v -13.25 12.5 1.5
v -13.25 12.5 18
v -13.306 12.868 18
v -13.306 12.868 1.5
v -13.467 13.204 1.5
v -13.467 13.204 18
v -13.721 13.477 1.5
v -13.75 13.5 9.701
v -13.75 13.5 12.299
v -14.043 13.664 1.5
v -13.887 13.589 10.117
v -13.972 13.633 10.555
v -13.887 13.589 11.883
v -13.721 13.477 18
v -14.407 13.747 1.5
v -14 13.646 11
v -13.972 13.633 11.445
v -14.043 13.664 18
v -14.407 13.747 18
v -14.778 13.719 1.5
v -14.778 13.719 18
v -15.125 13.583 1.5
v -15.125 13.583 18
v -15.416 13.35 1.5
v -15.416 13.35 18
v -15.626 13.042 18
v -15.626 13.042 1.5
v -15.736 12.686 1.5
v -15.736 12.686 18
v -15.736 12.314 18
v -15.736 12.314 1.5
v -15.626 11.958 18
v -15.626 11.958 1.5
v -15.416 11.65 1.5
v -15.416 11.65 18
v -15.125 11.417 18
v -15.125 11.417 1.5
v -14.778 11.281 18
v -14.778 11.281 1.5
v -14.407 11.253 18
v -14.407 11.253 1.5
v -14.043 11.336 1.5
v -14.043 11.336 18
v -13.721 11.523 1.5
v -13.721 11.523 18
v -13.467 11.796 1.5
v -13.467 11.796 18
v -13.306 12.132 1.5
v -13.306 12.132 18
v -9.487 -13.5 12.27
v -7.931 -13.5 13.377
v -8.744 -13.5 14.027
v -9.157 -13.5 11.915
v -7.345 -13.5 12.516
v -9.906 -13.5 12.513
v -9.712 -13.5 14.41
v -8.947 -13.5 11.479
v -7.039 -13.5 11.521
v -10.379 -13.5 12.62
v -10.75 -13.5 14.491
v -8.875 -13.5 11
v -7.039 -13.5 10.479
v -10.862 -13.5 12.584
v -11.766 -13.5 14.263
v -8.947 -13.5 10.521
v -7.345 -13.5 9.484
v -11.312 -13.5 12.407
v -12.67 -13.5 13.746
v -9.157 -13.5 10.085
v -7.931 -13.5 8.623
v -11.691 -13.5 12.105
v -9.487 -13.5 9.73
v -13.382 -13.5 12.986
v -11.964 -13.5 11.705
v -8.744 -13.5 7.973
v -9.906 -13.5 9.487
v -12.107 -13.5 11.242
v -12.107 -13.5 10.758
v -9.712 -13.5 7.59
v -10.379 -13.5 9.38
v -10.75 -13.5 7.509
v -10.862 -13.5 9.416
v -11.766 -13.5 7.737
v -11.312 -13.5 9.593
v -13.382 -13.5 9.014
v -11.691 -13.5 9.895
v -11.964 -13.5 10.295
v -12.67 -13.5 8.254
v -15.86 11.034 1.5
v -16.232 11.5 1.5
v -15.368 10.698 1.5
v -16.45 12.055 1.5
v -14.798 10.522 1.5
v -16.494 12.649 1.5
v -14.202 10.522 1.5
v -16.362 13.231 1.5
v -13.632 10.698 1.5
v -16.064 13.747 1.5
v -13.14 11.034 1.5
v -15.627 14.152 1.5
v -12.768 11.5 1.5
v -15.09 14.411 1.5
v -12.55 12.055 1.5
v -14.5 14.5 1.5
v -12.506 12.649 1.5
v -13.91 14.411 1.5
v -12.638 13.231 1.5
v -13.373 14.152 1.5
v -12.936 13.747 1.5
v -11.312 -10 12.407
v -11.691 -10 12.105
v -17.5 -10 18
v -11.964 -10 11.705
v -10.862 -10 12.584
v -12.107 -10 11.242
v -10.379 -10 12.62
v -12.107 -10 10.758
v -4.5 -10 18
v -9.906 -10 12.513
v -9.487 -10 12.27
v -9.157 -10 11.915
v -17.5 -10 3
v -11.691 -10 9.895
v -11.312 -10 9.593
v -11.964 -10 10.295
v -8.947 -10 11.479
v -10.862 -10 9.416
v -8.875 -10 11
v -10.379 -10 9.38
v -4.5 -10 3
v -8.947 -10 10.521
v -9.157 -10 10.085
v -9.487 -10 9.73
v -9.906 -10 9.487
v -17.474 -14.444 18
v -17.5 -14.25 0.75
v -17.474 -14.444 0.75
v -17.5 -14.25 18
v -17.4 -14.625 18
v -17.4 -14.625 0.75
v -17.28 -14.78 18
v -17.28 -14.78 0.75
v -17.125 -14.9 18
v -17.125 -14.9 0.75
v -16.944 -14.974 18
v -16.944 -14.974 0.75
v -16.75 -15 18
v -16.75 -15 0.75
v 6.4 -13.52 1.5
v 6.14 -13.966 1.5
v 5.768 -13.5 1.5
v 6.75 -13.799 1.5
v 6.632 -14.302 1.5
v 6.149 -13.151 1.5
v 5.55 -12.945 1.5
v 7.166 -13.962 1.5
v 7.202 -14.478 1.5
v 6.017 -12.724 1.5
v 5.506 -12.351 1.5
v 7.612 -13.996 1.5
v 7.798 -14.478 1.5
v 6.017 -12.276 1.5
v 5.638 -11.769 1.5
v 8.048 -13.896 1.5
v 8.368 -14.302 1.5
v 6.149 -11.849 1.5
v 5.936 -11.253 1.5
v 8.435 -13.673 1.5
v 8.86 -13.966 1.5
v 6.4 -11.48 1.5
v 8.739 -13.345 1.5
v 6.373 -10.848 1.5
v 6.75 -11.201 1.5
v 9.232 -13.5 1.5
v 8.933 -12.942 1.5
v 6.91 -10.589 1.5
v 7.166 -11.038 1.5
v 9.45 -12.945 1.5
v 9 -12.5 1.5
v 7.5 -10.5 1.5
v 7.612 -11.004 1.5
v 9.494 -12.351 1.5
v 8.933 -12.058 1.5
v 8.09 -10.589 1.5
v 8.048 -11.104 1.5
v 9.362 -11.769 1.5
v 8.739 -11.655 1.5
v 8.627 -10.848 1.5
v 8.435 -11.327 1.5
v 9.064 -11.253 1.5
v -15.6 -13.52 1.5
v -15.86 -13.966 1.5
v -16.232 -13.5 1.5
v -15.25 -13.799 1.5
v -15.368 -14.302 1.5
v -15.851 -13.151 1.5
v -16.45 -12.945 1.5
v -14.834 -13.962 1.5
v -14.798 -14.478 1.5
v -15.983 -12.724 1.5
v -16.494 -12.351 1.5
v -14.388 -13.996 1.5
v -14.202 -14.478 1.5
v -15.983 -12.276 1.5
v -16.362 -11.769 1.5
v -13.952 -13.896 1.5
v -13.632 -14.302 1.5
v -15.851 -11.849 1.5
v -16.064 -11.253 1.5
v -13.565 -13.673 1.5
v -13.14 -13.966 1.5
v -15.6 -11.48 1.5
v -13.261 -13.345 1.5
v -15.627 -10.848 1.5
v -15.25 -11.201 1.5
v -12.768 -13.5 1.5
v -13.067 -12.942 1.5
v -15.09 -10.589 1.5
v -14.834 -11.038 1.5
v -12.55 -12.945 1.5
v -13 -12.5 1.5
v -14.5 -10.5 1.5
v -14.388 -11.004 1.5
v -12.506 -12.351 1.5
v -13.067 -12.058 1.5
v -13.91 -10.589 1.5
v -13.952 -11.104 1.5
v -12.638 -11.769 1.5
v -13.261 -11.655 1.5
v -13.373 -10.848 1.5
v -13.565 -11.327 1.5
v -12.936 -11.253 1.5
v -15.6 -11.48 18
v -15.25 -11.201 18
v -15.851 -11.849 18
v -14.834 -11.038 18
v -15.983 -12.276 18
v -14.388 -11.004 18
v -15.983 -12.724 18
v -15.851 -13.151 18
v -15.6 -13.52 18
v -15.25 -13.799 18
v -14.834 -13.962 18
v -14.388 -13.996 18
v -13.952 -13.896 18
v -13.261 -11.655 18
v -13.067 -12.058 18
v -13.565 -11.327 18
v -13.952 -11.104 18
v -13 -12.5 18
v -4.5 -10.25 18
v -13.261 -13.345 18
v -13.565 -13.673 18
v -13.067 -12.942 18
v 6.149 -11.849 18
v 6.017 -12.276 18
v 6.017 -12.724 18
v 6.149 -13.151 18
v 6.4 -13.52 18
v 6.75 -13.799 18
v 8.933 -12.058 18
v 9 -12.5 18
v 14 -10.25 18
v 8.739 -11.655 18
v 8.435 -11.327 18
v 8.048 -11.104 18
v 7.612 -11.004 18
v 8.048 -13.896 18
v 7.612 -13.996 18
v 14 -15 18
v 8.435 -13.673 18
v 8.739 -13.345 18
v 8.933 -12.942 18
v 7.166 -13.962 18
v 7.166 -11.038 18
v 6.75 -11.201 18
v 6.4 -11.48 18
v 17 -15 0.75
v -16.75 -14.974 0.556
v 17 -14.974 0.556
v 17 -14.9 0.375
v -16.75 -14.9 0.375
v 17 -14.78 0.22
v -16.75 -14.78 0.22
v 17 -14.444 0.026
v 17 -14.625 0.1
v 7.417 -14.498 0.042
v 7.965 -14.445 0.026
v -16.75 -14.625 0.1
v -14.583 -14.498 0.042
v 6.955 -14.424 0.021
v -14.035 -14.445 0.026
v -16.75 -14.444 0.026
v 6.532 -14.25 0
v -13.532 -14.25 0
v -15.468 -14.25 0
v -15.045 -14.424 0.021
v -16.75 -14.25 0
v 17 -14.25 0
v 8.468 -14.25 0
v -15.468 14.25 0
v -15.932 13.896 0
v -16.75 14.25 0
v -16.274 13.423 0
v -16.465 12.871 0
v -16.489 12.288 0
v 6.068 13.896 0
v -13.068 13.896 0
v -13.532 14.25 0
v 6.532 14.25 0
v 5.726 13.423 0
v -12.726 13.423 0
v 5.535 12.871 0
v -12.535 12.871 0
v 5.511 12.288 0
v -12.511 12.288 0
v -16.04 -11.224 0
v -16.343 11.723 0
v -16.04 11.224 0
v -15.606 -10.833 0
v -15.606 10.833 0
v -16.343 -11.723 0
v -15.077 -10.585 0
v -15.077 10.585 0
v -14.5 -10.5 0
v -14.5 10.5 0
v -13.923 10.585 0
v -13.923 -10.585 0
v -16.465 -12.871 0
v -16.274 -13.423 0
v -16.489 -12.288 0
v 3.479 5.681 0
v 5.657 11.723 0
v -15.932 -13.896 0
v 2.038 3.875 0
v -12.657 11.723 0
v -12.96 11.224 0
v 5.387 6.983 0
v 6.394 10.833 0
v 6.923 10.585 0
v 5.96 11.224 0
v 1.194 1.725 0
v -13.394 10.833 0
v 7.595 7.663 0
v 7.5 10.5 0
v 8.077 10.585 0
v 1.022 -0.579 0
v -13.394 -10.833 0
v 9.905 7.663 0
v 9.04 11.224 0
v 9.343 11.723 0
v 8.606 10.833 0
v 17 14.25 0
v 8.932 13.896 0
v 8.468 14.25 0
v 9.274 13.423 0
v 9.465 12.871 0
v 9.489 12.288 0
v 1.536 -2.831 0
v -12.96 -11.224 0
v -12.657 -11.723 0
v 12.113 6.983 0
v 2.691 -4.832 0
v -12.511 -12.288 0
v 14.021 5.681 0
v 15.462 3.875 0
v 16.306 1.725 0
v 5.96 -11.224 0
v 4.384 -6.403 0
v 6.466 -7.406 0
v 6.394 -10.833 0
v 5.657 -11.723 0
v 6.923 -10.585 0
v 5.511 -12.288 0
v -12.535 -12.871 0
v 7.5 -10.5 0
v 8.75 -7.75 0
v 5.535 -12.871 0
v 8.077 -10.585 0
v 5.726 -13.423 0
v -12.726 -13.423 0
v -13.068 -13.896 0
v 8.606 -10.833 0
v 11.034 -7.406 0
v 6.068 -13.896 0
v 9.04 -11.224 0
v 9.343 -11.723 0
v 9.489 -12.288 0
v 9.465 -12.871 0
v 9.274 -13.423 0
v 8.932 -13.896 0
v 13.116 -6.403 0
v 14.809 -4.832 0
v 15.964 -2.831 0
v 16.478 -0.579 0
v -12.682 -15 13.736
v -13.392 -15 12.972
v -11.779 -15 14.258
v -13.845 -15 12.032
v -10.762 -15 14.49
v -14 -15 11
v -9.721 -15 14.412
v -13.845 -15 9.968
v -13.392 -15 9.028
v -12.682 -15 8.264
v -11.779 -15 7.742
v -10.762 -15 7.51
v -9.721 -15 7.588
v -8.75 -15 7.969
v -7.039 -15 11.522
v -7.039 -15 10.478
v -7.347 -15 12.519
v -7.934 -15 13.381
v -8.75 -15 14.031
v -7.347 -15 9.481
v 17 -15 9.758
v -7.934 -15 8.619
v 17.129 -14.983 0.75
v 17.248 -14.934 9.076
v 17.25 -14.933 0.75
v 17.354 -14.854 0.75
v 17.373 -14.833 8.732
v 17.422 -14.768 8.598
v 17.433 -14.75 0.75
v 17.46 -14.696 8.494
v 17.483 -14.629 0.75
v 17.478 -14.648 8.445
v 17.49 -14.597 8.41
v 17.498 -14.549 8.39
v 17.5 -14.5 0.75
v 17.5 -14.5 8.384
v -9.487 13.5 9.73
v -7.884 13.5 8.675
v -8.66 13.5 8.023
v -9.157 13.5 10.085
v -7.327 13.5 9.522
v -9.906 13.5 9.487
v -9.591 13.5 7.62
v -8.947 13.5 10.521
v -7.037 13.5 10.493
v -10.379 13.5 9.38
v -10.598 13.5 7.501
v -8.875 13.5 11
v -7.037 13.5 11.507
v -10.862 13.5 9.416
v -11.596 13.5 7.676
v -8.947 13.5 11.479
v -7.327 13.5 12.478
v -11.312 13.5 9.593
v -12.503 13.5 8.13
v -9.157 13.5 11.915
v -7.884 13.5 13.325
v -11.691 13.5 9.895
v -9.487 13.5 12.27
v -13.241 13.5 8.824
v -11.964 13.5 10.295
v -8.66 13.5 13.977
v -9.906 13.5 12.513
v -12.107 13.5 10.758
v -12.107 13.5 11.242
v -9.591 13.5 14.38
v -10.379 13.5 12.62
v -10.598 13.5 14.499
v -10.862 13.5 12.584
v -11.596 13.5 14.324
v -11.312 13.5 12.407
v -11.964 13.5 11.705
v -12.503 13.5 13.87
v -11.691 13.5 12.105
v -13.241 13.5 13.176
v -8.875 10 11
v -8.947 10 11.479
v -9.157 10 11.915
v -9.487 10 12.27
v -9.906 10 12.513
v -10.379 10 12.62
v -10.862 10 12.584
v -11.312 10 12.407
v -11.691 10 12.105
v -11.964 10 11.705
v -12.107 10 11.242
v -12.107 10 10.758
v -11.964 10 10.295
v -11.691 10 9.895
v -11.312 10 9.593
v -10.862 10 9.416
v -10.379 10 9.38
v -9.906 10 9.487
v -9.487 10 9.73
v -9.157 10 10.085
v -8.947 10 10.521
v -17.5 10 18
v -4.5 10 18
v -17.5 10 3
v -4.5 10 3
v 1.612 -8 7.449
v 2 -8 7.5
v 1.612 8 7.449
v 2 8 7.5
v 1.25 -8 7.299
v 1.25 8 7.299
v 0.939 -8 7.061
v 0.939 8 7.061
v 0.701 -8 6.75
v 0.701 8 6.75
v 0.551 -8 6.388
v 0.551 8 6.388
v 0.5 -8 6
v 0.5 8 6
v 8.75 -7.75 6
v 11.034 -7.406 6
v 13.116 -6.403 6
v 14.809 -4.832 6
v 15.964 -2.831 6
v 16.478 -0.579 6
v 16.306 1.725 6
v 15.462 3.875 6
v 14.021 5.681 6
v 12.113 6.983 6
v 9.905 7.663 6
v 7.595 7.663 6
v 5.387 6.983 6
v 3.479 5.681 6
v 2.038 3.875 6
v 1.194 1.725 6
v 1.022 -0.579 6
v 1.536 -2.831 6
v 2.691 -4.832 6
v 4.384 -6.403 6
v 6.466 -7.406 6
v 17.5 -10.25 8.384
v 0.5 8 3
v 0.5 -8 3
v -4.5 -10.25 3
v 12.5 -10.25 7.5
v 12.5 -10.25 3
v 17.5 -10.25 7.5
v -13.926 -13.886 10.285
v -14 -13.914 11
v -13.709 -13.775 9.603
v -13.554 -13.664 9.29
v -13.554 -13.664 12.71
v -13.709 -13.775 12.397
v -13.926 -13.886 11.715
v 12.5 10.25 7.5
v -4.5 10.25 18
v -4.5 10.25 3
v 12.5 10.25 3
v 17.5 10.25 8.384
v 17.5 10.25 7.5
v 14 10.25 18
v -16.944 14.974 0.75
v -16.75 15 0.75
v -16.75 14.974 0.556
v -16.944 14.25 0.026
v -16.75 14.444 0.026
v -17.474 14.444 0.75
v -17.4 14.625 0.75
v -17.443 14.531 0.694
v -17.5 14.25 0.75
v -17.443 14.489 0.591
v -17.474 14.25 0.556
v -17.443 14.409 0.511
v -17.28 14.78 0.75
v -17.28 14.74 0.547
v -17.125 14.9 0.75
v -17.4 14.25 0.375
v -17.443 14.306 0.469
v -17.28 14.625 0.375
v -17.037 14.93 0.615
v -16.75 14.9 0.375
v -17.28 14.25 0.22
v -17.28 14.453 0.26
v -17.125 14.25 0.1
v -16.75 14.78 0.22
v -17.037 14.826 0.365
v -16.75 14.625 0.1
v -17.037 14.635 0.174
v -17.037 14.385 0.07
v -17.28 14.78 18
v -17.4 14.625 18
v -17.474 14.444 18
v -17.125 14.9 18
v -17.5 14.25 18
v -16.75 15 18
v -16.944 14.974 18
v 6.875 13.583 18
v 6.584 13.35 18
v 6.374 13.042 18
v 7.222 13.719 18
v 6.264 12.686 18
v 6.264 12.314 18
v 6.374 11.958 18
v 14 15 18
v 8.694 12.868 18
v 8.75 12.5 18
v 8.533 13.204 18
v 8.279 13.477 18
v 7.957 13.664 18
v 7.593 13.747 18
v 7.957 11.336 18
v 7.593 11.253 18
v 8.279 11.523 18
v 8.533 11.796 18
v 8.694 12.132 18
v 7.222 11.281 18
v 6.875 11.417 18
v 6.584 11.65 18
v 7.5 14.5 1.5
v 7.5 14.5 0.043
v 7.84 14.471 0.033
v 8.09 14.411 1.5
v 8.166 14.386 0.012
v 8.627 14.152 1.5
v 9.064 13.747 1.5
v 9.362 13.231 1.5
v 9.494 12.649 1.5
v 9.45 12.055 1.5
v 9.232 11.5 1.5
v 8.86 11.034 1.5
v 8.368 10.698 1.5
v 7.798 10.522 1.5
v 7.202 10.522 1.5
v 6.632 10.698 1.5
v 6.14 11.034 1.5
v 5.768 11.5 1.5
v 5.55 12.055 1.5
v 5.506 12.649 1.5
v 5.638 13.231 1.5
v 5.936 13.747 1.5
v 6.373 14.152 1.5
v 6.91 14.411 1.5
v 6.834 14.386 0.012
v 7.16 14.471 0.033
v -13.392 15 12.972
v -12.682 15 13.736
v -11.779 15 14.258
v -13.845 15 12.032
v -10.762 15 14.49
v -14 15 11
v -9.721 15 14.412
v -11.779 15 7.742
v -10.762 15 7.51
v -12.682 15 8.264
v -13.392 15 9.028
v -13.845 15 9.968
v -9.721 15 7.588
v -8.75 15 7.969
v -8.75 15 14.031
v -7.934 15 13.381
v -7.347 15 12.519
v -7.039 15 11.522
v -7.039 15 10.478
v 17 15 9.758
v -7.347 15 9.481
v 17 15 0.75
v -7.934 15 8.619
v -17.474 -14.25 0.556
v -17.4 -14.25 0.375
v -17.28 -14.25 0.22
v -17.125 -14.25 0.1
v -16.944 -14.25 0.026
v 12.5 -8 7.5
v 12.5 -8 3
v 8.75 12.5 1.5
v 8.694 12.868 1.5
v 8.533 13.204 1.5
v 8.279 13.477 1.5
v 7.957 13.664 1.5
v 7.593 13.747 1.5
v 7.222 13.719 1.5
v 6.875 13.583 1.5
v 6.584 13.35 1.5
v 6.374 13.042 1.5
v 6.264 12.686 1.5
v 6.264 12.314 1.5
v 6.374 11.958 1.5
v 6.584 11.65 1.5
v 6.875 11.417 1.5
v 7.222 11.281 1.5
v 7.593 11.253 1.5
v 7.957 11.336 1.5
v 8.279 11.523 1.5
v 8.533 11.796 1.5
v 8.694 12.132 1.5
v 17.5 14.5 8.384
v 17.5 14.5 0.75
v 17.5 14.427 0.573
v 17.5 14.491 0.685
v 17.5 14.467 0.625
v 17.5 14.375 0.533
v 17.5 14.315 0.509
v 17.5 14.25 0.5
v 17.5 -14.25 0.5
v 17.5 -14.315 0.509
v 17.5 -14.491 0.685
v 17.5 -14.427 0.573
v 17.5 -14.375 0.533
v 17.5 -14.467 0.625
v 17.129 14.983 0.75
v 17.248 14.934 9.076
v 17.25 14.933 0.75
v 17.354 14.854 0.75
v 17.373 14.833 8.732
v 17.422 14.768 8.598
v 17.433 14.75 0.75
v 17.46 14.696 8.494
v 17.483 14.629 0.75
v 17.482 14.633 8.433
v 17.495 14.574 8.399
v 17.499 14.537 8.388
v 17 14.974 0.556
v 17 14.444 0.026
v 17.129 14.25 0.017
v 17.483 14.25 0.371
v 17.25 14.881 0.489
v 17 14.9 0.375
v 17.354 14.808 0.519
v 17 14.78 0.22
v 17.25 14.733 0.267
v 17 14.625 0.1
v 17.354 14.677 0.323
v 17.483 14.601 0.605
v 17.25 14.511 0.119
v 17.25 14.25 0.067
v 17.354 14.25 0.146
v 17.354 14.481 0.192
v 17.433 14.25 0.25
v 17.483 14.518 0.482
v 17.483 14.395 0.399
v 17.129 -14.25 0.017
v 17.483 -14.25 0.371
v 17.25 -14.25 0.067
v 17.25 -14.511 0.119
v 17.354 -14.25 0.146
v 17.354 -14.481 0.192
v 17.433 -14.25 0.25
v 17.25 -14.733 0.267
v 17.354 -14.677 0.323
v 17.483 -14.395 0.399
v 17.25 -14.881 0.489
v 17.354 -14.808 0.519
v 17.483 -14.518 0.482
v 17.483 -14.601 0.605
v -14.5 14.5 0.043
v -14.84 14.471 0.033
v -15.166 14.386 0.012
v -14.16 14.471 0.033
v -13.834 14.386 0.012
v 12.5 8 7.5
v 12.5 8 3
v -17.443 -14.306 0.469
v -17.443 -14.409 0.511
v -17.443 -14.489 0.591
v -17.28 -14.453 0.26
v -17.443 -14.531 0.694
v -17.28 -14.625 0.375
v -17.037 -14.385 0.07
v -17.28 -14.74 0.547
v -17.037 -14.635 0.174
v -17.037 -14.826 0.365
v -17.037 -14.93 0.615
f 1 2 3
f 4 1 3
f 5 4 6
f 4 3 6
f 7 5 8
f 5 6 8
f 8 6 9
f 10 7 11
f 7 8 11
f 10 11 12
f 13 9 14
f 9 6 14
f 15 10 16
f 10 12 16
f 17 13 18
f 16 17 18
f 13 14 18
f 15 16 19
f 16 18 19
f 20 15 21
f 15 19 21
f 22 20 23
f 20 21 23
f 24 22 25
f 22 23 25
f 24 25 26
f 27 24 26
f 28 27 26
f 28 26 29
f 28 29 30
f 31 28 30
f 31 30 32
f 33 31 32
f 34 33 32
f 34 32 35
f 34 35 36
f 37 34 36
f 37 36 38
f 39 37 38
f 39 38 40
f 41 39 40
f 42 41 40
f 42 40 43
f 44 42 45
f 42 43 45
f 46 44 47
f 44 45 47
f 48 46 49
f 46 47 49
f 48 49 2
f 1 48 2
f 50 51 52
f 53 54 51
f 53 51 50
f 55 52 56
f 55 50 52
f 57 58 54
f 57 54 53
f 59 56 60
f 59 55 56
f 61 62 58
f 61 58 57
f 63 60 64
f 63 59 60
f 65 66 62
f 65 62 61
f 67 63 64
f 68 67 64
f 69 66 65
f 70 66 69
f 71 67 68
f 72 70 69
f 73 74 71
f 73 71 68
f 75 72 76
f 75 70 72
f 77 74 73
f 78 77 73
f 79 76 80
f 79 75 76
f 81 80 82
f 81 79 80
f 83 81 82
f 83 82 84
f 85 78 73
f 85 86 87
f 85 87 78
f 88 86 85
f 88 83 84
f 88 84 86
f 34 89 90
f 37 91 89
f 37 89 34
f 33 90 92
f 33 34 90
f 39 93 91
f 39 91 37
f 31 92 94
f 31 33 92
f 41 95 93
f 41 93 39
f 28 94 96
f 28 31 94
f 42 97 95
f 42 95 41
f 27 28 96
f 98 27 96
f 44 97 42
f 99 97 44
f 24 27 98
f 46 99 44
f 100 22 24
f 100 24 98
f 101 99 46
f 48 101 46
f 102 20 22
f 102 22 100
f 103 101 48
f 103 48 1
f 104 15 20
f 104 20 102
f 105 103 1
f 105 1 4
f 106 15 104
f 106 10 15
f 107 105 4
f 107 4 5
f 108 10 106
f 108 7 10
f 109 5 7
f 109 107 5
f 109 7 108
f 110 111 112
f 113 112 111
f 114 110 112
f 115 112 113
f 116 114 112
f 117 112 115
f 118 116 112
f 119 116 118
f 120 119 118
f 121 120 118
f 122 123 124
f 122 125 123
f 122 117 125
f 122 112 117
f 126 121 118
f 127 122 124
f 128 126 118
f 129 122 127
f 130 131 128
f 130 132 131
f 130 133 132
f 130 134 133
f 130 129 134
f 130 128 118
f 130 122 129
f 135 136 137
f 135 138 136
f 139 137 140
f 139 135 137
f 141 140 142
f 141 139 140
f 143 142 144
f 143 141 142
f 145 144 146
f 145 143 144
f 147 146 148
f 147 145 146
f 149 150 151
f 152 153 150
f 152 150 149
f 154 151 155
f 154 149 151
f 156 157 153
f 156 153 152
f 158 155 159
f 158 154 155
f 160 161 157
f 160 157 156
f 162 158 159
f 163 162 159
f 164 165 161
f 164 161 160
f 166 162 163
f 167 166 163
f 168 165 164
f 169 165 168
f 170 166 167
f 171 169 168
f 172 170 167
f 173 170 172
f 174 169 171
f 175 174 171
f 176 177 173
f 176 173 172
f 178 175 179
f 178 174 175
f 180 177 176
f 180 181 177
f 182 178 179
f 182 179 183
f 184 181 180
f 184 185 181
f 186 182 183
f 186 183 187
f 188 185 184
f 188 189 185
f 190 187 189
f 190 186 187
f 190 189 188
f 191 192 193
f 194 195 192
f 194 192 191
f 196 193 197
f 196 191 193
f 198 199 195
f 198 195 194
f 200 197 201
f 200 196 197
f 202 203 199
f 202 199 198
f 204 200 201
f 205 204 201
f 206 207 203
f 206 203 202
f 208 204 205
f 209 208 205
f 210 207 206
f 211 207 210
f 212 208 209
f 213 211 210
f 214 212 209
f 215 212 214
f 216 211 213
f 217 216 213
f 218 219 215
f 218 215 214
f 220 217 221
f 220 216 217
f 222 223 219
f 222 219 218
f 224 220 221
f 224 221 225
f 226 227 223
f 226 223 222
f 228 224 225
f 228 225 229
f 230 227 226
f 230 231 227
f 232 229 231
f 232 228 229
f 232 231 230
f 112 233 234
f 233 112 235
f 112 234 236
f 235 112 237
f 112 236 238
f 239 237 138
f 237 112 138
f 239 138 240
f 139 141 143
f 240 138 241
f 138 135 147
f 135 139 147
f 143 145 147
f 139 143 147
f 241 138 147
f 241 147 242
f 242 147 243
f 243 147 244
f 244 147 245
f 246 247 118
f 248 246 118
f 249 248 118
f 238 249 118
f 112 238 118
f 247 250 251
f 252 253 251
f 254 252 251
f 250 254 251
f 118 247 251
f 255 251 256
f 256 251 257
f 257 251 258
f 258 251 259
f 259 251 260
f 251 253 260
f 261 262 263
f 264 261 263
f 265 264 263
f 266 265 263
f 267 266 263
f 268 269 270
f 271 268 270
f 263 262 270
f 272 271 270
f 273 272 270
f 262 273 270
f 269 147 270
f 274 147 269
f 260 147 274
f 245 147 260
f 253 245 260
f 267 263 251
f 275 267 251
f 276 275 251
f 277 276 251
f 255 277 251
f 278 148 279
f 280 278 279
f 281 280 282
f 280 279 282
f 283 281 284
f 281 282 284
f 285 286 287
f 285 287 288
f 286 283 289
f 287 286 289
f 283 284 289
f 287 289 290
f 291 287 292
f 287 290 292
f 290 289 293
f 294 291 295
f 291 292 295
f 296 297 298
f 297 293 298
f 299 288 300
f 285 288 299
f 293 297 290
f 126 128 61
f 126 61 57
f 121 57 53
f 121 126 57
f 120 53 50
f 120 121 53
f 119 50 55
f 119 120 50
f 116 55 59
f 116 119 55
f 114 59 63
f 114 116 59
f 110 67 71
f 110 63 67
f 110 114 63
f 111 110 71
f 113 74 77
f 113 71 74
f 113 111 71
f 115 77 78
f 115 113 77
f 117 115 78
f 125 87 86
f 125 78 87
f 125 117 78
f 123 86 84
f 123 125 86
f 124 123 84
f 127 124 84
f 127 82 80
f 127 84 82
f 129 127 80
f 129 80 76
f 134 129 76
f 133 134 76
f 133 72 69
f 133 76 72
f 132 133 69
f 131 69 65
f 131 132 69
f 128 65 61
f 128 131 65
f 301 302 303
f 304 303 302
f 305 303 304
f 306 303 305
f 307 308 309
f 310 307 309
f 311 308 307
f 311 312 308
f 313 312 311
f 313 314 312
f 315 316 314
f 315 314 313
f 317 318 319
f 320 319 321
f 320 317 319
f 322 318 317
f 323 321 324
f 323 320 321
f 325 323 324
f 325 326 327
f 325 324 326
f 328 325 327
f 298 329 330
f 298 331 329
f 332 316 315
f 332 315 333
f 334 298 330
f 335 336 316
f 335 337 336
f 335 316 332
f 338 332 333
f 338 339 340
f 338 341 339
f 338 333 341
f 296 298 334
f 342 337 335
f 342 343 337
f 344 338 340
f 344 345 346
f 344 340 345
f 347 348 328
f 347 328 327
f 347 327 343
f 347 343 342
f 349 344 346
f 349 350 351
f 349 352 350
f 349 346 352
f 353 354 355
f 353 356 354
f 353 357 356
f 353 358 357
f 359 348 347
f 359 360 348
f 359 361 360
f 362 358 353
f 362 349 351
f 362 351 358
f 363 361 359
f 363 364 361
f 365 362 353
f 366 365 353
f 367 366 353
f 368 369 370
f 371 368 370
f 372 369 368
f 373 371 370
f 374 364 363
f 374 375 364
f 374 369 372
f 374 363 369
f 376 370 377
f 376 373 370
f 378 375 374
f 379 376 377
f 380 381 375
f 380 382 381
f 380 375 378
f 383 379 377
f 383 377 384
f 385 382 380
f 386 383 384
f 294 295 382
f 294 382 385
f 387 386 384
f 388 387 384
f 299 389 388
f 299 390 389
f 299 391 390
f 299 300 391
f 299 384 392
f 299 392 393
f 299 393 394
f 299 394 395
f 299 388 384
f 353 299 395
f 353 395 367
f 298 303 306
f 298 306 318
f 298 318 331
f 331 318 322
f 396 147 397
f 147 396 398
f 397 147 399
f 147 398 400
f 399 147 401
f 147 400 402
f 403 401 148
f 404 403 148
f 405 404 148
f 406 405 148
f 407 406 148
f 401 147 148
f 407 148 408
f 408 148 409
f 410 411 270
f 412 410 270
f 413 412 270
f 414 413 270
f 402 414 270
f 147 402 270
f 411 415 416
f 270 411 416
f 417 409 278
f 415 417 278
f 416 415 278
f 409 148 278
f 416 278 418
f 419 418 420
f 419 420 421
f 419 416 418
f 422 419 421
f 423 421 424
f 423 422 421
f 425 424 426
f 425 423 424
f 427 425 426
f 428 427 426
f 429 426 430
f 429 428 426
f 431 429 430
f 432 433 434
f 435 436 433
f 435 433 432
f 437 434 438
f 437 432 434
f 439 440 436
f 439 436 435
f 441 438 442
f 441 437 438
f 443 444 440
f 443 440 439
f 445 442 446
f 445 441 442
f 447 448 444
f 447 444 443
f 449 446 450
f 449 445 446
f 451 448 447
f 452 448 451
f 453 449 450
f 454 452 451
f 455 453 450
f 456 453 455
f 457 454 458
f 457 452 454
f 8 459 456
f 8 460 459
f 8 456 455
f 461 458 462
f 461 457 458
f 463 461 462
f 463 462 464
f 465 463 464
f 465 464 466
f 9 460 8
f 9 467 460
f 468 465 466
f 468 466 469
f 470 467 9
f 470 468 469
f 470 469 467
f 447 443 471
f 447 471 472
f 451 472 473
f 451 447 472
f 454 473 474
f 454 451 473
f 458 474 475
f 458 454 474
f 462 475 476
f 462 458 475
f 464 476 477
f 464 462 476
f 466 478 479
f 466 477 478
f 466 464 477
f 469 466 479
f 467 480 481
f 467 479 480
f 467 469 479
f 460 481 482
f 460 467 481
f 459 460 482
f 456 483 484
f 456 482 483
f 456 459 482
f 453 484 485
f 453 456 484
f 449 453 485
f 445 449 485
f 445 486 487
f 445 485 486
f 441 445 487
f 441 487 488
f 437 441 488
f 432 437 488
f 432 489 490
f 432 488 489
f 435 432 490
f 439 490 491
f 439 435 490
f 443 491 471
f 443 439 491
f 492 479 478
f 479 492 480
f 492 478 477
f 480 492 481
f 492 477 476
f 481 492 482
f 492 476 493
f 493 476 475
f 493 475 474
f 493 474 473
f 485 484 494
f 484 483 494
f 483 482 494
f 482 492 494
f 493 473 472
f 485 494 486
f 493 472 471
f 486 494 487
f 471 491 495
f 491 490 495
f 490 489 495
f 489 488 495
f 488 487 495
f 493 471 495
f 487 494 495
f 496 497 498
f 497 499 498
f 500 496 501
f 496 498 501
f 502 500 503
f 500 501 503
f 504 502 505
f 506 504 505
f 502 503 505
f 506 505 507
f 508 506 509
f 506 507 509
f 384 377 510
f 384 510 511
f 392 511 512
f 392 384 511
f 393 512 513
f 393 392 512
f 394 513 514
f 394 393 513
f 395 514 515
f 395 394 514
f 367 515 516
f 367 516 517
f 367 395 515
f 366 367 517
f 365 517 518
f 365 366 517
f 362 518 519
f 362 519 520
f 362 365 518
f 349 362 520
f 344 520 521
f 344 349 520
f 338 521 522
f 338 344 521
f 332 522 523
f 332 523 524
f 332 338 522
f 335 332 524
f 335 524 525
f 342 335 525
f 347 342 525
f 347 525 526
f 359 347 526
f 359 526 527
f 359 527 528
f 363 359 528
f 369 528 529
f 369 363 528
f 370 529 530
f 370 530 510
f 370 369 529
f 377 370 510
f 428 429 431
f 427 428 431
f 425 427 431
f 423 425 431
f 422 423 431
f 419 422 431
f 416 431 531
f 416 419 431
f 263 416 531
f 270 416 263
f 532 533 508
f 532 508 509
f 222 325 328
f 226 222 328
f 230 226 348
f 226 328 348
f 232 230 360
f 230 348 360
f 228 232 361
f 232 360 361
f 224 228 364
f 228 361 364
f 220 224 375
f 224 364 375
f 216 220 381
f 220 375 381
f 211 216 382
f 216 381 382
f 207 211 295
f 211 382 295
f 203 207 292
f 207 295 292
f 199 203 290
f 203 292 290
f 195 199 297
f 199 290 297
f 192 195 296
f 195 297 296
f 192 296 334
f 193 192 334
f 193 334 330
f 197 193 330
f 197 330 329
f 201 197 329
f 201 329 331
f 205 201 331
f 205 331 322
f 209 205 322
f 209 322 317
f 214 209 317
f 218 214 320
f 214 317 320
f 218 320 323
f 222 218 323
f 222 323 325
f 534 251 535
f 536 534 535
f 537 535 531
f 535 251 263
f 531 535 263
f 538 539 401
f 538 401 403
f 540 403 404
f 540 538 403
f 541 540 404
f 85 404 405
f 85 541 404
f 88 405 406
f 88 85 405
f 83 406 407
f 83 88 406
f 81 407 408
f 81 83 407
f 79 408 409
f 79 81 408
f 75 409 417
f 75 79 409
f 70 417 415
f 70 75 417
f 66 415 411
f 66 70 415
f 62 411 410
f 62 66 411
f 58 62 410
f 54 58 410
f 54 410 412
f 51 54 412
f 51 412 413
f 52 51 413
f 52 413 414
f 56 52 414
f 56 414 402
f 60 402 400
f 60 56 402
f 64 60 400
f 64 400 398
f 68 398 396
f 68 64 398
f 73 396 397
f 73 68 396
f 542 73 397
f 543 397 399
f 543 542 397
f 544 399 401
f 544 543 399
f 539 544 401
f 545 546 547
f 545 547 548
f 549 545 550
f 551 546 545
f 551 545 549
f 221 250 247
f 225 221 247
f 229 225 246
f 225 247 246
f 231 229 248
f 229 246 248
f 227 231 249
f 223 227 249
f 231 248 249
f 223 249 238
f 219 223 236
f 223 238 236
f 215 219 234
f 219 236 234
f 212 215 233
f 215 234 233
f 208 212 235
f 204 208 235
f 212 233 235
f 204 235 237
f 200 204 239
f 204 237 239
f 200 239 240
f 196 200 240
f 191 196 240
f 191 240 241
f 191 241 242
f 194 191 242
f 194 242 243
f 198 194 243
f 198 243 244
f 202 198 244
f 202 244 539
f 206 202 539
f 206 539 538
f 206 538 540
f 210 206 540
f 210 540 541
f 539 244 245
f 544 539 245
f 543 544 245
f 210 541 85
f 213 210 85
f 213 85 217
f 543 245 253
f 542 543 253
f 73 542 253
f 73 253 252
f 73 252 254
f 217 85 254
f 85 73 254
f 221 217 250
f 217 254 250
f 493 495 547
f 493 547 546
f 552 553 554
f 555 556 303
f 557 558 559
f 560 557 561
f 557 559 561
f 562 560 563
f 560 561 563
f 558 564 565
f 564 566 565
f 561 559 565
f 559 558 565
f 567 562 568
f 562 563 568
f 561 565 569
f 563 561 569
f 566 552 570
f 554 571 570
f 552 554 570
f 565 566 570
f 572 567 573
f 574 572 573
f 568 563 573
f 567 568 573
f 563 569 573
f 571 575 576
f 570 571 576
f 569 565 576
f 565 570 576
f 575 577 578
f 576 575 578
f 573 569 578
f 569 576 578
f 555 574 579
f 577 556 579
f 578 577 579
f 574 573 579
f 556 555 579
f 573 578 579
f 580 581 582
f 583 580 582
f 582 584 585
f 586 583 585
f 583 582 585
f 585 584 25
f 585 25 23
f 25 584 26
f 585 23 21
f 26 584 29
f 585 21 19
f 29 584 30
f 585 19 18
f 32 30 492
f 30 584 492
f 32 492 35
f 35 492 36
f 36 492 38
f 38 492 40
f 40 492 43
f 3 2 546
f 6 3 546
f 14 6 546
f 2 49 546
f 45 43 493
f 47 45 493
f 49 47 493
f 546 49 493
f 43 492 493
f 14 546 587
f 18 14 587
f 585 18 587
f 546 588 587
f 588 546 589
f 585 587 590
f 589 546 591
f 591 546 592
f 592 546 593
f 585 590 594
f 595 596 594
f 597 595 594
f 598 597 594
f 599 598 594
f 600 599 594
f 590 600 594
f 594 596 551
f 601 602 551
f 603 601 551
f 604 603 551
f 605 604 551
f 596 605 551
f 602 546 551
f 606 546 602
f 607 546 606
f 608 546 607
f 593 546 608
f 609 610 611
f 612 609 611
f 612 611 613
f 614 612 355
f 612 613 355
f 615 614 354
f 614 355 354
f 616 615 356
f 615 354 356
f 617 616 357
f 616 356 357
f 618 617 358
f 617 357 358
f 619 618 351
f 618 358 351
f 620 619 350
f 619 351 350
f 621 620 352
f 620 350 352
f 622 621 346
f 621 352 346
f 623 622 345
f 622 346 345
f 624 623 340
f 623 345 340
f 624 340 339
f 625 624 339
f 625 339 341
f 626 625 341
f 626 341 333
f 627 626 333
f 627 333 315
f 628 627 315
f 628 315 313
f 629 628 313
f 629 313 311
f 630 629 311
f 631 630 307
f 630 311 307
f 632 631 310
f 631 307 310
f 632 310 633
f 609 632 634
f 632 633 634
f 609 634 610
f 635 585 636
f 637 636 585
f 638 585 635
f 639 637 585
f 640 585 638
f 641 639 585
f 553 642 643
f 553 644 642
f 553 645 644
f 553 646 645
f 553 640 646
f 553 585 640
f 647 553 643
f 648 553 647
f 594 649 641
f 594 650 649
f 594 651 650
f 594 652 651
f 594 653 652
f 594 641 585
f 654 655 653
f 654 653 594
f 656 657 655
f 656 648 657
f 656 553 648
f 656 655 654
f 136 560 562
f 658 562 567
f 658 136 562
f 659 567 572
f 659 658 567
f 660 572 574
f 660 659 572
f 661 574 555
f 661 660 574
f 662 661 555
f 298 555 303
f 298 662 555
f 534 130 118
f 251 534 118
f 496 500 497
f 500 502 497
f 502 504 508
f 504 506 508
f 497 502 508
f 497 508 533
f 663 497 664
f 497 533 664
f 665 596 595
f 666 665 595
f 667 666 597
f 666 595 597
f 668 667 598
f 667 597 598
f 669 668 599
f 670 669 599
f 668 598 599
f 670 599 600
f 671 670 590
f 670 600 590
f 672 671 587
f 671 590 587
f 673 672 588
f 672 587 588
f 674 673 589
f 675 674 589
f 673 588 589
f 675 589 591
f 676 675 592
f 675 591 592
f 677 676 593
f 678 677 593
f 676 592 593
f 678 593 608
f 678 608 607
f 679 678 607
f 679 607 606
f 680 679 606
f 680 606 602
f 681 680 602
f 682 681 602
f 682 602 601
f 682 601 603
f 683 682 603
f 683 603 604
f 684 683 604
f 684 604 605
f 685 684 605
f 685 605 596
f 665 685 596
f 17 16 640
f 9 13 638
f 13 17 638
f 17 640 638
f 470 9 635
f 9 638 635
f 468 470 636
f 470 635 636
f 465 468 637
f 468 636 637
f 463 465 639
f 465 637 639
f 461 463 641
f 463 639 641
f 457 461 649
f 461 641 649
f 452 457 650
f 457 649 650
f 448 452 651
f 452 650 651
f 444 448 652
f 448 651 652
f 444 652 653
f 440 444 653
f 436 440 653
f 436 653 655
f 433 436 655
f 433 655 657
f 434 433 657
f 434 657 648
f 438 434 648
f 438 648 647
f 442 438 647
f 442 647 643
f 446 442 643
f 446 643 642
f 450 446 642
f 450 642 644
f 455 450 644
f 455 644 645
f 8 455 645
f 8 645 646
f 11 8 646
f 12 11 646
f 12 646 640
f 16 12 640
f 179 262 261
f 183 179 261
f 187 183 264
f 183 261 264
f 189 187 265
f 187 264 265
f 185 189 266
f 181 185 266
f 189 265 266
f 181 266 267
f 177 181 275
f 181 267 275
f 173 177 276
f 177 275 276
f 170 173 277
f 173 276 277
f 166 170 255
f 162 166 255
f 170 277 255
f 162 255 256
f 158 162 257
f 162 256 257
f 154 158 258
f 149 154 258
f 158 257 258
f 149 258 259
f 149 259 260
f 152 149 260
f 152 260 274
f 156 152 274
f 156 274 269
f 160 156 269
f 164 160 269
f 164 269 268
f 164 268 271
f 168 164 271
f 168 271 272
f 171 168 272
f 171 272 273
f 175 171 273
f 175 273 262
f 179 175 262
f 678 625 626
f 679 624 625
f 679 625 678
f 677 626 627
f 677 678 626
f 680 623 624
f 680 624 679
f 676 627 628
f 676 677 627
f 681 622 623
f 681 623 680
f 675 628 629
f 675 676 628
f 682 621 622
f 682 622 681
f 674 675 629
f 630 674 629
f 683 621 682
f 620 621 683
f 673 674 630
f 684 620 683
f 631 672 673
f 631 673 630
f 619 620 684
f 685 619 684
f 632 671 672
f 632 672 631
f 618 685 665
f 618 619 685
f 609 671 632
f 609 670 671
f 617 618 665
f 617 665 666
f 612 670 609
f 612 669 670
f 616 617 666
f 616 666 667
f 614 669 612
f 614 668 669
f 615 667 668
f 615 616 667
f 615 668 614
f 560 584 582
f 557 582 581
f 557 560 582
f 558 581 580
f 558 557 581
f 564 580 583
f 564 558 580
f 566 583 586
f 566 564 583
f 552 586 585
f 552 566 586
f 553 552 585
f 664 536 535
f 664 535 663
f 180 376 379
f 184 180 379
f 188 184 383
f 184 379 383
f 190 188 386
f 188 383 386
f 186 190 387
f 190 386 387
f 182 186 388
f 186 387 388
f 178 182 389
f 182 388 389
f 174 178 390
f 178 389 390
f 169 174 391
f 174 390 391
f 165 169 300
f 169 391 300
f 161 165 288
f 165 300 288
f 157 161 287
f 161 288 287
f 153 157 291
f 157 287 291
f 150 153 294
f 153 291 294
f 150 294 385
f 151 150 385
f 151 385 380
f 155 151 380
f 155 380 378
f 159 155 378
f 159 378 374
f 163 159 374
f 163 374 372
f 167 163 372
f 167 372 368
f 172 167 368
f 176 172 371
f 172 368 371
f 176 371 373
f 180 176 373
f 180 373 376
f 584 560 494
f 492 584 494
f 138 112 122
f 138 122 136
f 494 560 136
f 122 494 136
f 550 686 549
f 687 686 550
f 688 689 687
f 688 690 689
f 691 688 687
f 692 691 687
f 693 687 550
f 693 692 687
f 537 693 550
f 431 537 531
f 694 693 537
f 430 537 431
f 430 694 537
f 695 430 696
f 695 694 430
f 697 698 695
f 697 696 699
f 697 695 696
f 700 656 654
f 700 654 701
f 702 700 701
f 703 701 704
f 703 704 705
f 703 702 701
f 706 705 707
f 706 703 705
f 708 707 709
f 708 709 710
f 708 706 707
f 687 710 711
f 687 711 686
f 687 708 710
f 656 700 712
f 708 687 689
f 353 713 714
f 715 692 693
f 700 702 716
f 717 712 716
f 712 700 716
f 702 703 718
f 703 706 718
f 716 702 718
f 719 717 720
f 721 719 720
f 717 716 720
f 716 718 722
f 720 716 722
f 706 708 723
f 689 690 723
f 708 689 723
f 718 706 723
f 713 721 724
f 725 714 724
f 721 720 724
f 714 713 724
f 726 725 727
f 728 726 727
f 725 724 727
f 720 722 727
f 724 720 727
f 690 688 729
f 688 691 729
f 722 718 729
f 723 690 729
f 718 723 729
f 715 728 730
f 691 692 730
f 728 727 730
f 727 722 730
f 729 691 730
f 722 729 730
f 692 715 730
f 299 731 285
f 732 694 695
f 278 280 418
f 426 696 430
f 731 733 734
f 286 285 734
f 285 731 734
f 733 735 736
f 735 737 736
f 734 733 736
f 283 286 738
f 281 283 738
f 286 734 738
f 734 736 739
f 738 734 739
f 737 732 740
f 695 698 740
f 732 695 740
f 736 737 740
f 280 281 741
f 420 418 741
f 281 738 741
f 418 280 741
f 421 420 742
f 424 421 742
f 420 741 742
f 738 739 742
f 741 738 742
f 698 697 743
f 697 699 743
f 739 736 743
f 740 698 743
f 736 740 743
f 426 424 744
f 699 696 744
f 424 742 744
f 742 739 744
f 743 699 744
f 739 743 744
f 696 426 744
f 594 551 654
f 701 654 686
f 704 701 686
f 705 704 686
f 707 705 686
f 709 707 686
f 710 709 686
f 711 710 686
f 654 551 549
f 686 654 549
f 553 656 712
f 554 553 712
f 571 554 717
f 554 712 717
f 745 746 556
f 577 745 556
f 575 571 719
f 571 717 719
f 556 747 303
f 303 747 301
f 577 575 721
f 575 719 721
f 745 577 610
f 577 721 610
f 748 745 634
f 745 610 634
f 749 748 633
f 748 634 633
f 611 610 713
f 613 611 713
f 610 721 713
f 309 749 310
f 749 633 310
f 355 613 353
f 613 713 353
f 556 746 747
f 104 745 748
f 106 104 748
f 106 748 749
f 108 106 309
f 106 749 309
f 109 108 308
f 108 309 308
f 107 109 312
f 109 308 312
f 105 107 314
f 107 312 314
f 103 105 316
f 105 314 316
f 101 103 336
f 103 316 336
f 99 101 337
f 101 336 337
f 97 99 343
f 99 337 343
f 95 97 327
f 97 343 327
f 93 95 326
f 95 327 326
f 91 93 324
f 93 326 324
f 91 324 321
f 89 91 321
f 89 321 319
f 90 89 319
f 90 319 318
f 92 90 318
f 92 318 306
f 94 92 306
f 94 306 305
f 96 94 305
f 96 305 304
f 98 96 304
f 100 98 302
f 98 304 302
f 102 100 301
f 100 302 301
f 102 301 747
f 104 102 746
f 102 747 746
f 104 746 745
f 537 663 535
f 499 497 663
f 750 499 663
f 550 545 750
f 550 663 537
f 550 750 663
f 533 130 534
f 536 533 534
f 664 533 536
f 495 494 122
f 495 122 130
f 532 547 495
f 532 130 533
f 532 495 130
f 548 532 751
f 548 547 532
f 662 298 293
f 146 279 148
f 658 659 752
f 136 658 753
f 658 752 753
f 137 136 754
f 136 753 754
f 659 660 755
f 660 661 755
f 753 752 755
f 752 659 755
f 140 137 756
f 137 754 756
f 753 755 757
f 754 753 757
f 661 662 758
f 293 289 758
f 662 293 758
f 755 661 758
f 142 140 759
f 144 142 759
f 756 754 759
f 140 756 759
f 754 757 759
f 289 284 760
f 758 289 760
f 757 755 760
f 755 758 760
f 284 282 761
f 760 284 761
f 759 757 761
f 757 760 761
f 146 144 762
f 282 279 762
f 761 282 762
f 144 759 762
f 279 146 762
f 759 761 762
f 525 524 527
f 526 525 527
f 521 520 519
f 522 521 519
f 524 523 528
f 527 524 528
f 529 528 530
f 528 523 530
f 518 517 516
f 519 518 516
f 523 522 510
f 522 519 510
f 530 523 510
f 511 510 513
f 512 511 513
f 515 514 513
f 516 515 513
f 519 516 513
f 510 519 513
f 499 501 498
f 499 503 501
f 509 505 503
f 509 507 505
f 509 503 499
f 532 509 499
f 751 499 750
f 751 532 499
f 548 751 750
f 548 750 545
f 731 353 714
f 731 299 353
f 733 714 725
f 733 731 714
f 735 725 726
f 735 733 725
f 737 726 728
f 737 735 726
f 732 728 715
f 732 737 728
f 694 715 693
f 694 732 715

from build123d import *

# Parameters (mm, degrees)
SKETCH1_W              = 35
SKETCH1_H              = 20
BASE_PLATE_DEPTH       = 3
SKETCH2_W              = 35
SKETCH2_H              = 5
SIDE_WALLS_DEPTH       = 18
SKETCH4_R              = 1.5
SKETCH4_R_2            = 1.25
M2_SCREWS_DEPTH        = 18
SKETCH6_W              = 5
SKETCH6_H              = 20
RETURN_STOPPER_DEPTH   = 4.5
SKETCH9_W              = 12
SKETCH9_H              = 16
BOSS_EXTRUDE1_DEPTH    = 4.5
SKETCH7_R              = 7.75
MAGNET_POCKET_DEPTH    = 6
SKETCH8_R              = 2
M2_SCREW_HEAD_DEPTH    = 1.5
M3_ACHSLE_DEPTH        = 36.429507476
M3_ACHSLE_DEPTH_BACK   = 36.429507476
SKETCH5_R              = 1.625
SKETCH14_R             = 3.5
CUT_EXTRUDE1_DEPTH     = 1.5
CUT_EXTRUDE2_START     = -1.5
SKETCH15_R             = 3.5
CUT_EXTRUDE2_DEPTH     = 1.5
FILLET1_R              = 1.5
LEAVER_START           = -0.25
SKETCH11_W             = 22
SKETCH11_H             = 10.5
LEAVER_SPACE_DEPTH     = 20.5
SKETCH12_W             = 17
SKETCH12_H             = 4.5
MORE_SPACE_LEFT_DEPTH  = 0.25
SKETCH13_W             = 17
SKETCH13_H             = 4.5
MORE_SPACE_RIGHT_DEPTH = 0.25
FILLET2_R              = 0.75
FILLET3_R              = 0.75
FILLET4_R              = 0.75
FILLET5_R              = 0.5
CHAMFER1_SIZE          = 3.5
CHAMFER1_SIZE_2        = 9.616170968


with BuildPart() as part:
    # Sketch1 → Base Plate (new body)
    with BuildSketch(Plane.XY):
        Rectangle(SKETCH1_W, SKETCH1_H)
    extrude(amount=BASE_PLATE_DEPTH)

    # Sketch2 → Side Walls (add)
    with BuildSketch(Plane(origin=(0, 0, 0), x_dir=(1, 0, 0), z_dir=(0, 0, -1))):
        with Locations((0, -12.5)):
            Rectangle(SKETCH2_W, SKETCH2_H)
        with Locations((0, 12.5)):
            Rectangle(SKETCH2_W, SKETCH2_H)
    extrude(amount=-SIDE_WALLS_DEPTH)

    # Sketch4 → M2 Screws (cut)
    with BuildSketch(Plane.XY.offset(18)):
        with Locations((-14.5, -12.5)):
            Circle(SKETCH4_R)
        with Locations((7.5, -12.5)):
            Circle(SKETCH4_R)
        with Locations((7.5, 12.5)):
            Circle(SKETCH4_R_2)
        with Locations((-14.5, 12.5)):
            Circle(SKETCH4_R_2)
    extrude(amount=-M2_SCREWS_DEPTH, mode=Mode.SUBTRACT)

    # Sketch6 → Return Stopper (add)
    with BuildSketch(Plane.XY.offset(3)):
        with Locations((15, 0)):
            Rectangle(SKETCH6_W, SKETCH6_H)
    extrude(amount=RETURN_STOPPER_DEPTH)

    # Sketch9 → Boss-Extrude1 (add)
    with BuildSketch(Plane.XY.offset(3)):
        with Locations((6.5, 0)):
            Rectangle(SKETCH9_W, SKETCH9_H)
    extrude(amount=BOSS_EXTRUDE1_DEPTH)

    # Sketch7 → Magnet Pocket (cut)
    with BuildSketch(Plane(origin=(0, 0, 0), x_dir=(-1, 0, 0), z_dir=(0, 0, 1))):
        with Locations(Location((-8.75, 0, 0), (0, 0, 90))):
            Circle(SKETCH7_R)
    extrude(amount=MAGNET_POCKET_DEPTH, mode=Mode.SUBTRACT)

    # Sketch8 → M2 Screw Head (cut)
    with BuildSketch(Plane(origin=(0, 0, 0), x_dir=(1, 0, 0), z_dir=(0, 0, -1))):
        with Locations(Location((7.5, -12.5, 0), (0, 0, 270))):
            Circle(SKETCH8_R)
        with Locations(Location((-14.5, -12.5, 0), (0, 0, 270))):
            Circle(SKETCH8_R)
        with Locations(Location((7.5, 12.5, 0), (0, 0, 270))):
            Circle(SKETCH8_R)
        with Locations(Location((-14.5, 12.5, 0), (0, 0, 270))):
            Circle(SKETCH8_R)
    extrude(amount=-M2_SCREW_HEAD_DEPTH, mode=Mode.SUBTRACT)

    # Sketch5 → M3 Achsle (cut, two sides: drawn at the far end of the back side and taken through both)
    with BuildSketch(Plane.XZ.offset(-10).offset(-M3_ACHSLE_DEPTH_BACK)):
        with Locations((-10.5, 11)):
            Circle(SKETCH5_R)
    extrude(amount=M3_ACHSLE_DEPTH + M3_ACHSLE_DEPTH_BACK, mode=Mode.SUBTRACT)

    # Sketch14 → Cut-Extrude1 (cut)
    with BuildSketch(Plane(origin=(0, 15, 0), x_dir=(-1, 0, 0), z_dir=(0, 1, 0))):
        with Locations((10.5, 11)):
            Circle(SKETCH14_R)
    extrude(amount=-CUT_EXTRUDE1_DEPTH, mode=Mode.SUBTRACT)

    # Sketch15 → Cut-Extrude2 (cut)
    with BuildSketch(Plane.XZ.offset(15).offset(CUT_EXTRUDE2_START)):
        with Locations(Location((-10.5, 11, 0), (0, 0, 180))):
            Circle(SKETCH15_R)
    extrude(amount=CUT_EXTRUDE2_DEPTH, mode=Mode.SUBTRACT)

    # Fillet1
    fillet1_edges = [part.edges().sort_by_distance(p)[0] for p in [
        (0.5, 0, 7.5),
    ]]
    fillet(fillet1_edges, radius=FILLET1_R)

    # Sketch11 → Leaver Space (cut)
    with BuildSketch(Plane.XZ.offset(-10).offset(LEAVER_START)):
        with Locations((6.5, 12.75)):
            Rectangle(SKETCH11_W, SKETCH11_H)
    extrude(amount=LEAVER_SPACE_DEPTH, mode=Mode.SUBTRACT)

    # Sketch12 → More Space left (cut)
    with BuildSketch(Plane.XZ.offset(-10)):
        with Locations((4, 5.25)):
            Rectangle(SKETCH12_W, SKETCH12_H)
    extrude(amount=-MORE_SPACE_LEFT_DEPTH, mode=Mode.SUBTRACT)

    # Sketch13 → More Space right (cut)
    with BuildSketch(Plane(origin=(0, -10, 0), x_dir=(-1, 0, 0), z_dir=(0, 1, 0))):
        with Locations((-4, 5.25)):
            Rectangle(SKETCH13_W, SKETCH13_H)
    extrude(amount=-MORE_SPACE_RIGHT_DEPTH, mode=Mode.SUBTRACT)

    # Fillet2
    # the kernel refuses this fillet: 0.75 mm, written as the material it takes off along each edge
    with BuildSketch(Plane(origin=(19.375, 15, 0), x_dir=(0, -1, 0), z_dir=(-1, 0, 0))) as fillet2_piece_1:
        with BuildLine():
            CenterArc((FILLET2_R, FILLET2_R), FILLET2_R, 180, 90)
            Line((0, FILLET2_R), (0, 0))
            Line((0, 0), (FILLET2_R, 0))
        make_face()
    extrude(amount=38.75, mode=Mode.SUBTRACT)

    # Fillet3
    # the kernel refuses this fillet: 0.75 mm, written as the material it takes off along each edge
    with BuildSketch(Plane(origin=(-19.375, -15, 0), x_dir=(0, 1, 0), z_dir=(1, 0, 0))) as fillet3_piece_1:
        with BuildLine():
            CenterArc((FILLET3_R, FILLET3_R), FILLET3_R, 180, 90)
            Line((0, FILLET3_R), (0, 0))
            Line((0, 0), (FILLET3_R, 0))
        make_face()
    extrude(amount=38.75, mode=Mode.SUBTRACT)

    # Fillet4
    fillet4_edges = [part.edges().sort_by_distance(p)[0] for p in [
        (-17.5, -15, 9.375),
        (-17.5, 0, 0),
        (-17.5, 14.780330086, 0.219669914),
        (-17.5, -14.780330086, 0.219669914),
        (-17.5, 15, 9.375),
    ]]
    fillet(fillet4_edges, radius=FILLET4_R)

    # Fillet5
    fillet5_edges = [part.edges().sort_by_distance(p)[0] for p in [
        (17.5, -15, 9.375),
        (17.5, 14.780330086, 0.219669914),
        (17.5, 0, 0),
        (17.5, -14.780330086, 0.219669914),
        (17.5, 15, 9.375),
    ]]
    fillet(fillet5_edges, radius=FILLET5_R)

    # Chamfer1
    # the kernel refuses this chamfer: 9.616170968, 3.5 mm, written as the material it takes off along each edge
    with BuildSketch(Plane(origin=(17.5, -14.696220073, 18), x_dir=(-0.9950833631817486, 0, 0.09904090225205049), z_dir=(0, 1, 0))) as chamfer1_piece_1:
        Polygon((CHAMFER1_SIZE * 0.995083363182, -CHAMFER1_SIZE * 0.0990409022521), (-CHAMFER1_SIZE_2 * 0.099040902253, -CHAMFER1_SIZE_2 * 0.995083363191), (0, 0), align=None)
    extrude(amount=54.142440145, mode=Mode.SUBTRACT)
    with BuildSketch(Plane(origin=(17.5, -39.446220073, 18), x_dir=(0.013184058198645607, 0, -0.9999130865277316), z_dir=(0, 1, 0))) as chamfer1_piece_2:
        Polygon((CHAMFER1_SIZE_2 * 0.999913086537, CHAMFER1_SIZE_2 * 0.0131840581988), (-CHAMFER1_SIZE * 0.0131840581986, CHAMFER1_SIZE * 0.999913086528), (0, 0), align=None)
    extrude(amount=54.142440145, mode=Mode.SUBTRACT)


solid = part.part
